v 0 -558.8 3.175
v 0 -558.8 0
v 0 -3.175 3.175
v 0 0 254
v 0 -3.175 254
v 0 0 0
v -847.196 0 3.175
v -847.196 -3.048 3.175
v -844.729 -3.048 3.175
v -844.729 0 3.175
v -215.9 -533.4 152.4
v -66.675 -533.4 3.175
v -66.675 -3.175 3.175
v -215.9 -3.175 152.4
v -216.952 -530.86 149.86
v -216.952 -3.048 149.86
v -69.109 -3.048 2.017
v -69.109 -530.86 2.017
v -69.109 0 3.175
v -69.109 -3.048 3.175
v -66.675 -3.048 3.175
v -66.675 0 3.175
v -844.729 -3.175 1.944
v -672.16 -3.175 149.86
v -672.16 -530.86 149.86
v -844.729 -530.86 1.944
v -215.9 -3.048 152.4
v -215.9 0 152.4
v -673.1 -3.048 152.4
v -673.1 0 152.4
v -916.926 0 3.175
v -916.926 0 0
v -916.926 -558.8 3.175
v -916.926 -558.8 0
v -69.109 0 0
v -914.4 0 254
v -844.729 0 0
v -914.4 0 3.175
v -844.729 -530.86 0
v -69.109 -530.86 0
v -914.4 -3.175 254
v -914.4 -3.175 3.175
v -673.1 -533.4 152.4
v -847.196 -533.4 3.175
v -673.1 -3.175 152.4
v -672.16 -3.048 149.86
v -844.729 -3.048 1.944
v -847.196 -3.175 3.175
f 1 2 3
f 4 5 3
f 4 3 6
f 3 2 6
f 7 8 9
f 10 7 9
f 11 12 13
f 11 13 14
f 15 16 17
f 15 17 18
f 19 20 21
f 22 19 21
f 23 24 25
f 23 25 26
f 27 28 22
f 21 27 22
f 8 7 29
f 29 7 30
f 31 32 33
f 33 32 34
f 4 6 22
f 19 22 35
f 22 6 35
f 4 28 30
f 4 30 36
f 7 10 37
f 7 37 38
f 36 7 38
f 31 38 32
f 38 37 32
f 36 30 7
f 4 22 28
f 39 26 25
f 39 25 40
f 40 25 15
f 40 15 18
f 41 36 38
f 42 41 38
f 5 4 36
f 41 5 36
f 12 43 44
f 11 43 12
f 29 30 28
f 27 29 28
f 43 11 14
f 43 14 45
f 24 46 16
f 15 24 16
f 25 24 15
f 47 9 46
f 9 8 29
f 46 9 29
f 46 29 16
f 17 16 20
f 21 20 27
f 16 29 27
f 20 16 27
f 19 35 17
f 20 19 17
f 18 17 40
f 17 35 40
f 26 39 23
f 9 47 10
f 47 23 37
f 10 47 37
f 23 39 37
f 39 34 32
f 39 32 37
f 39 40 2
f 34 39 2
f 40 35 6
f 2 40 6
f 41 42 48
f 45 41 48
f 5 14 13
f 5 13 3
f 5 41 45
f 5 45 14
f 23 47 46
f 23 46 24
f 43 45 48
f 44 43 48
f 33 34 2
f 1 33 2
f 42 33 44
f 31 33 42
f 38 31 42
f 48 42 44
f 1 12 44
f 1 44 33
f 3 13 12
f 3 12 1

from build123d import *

# Parameters (mm, degrees)
F1_DEPTH    = 3.175
F2_START    = 3.048
F2_DEPTH    = 530.352
F3_T        = 2.54
F3_T3_DEPTH = 8.128
F3_T5_DEPTH = 220.6061469057
F3_T7_DEPTH = 239.2564292152
F3_T9_DEPTH = 462.28
F5_DEPTH    = 3.175


# Not quite as in the source:
# - a shell that OpenCascade refuses in one call is made with other operations: the cavity is built on its own and cut out


with BuildPart() as f1:
    # F0 (on Front) → F1 (new body)
    with BuildSketch(Plane.XZ):
        Polygon((-63.5, 0), (0, 0), (0, 254), (-914.4, 254), (-914.4, 0), (-850.9, 0), (-673.1, 152.4), (-215.9, 152.4), align=None)
    extrude(amount=F1_DEPTH)

    # F0 (on Front) → F2 (join)
    with BuildSketch(Plane.XZ.offset(F2_START)):
        Polygon((-850.9, 0), (-63.5, 0), (-215.9, 152.4), (-673.1, 152.4), align=None)
    extrude(amount=F2_DEPTH)

    # F3: shell of thickness 2.54, made by hand


with BuildPart() as f3_core1:
    # F3_t2: copy of F1
    add(f1.part)

    # the walls: a layer under each face that stays
    f3_faces = [f3_core1.faces().sort_by_distance(p)[0] for p in [
        (-139.7, -1.524, 76.2),
        (-762, 0, 127),
        (-444.5, -1.524, 152.4),
        (0, -1.5875, 127),
        (-457.2, -1.5875, 254),
        (-914.4, -1.5875, 127),
        (-762, -1.524, 76.2),
        (-762, -3.175, 127),
        (-762, -268.2875, 76.2),
        (-139.7, -268.2875, 76.2),
        (-457.2, -533.4, 76.2),
        (-444.5, -268.2875, 152.4),
    ]]
    thicken(f3_faces, amount=-F3_T, mode=Mode.SUBTRACT)

    # F3_s4 → F3_t3 (cut)
    with BuildSketch(Plane.XZ.offset(-2.54)):
        Polygon((-215.9179605122, 152.3566394878), (-214.1039487758, 154.1960512242), (-214.8478975516, 154.94), (-215.9, 154.94), align=None)
        Polygon((-673.0834698991, 152.3553148823), (-673.1, 154.94), (-674.0396071536, 154.94), (-674.7530100886, 154.32851177), align=None)
    extrude(amount=F3_T3_DEPTH, mode=Mode.SUBTRACT)

    # F3_s6 → F3_t5 (cut)
    with BuildSketch(Plane(origin=(-185.9460512242, 0, 185.9460512242), x_dir=(0, 1, 0), z_dir=(0.7071067812, 0, -0.7071067812))):
        Polygon((-3.2004, -44.8758806053), (-0.635, -44.9012806053), (-0.635, -47.4412806053), (-3.175, -47.4412806053), align=None)
    extrude(amount=F3_T5_DEPTH, mode=Mode.SUBTRACT)

    # F3_s8 → F3_t7 (cut)
    with BuildSketch(Plane(origin=(-492.4473352994, 0, -422.0977159709), x_dir=(0, 1, 0), z_dir=(0.7592566024, 0, 0.6507913735))):
        Polygon((-3.2004, 553.7837796737), (-0.635, 553.7583796737), (-0.635, 551.2183796737), (-3.175, 551.2183796737), align=None)
    extrude(amount=F3_T7_DEPTH, mode=Mode.SUBTRACT)

    # F3_s10 → F3_t9 (cut)
    with BuildSketch(Plane.YZ.offset(-675.64)):
        Polygon((-3.2004, 152.4254), (-0.635, 152.4), (-0.635, 149.86), (-3.175, 149.86), align=None)
    extrude(amount=F3_T9_DEPTH, mode=Mode.SUBTRACT)


with BuildPart() as f1_1:
    add(f1.part)

    # what is left inside the walls is the cavity
    f3_cavity = [f3_core1.part.solids().sort_by_distance(p)[0] for p in [
        (-457.044581, -354.922667, 0.0254),
    ]]
    add(f3_cavity, mode=Mode.SUBTRACT)

    # F4 (on Top) → F5 (join)
    with BuildSketch(Plane.XY):
        Polygon((0, -558.8), (0, 0), (-69.1089183092, 0), (-69.1089183092, -530.9250950813), (-844.7285890579, -530.9250950813), (-844.7285890579, 0), (-916.9259883143, 0), (-916.9259883143, -558.8), align=None)
    extrude(amount=F5_DEPTH)


solid = f1_1.part
